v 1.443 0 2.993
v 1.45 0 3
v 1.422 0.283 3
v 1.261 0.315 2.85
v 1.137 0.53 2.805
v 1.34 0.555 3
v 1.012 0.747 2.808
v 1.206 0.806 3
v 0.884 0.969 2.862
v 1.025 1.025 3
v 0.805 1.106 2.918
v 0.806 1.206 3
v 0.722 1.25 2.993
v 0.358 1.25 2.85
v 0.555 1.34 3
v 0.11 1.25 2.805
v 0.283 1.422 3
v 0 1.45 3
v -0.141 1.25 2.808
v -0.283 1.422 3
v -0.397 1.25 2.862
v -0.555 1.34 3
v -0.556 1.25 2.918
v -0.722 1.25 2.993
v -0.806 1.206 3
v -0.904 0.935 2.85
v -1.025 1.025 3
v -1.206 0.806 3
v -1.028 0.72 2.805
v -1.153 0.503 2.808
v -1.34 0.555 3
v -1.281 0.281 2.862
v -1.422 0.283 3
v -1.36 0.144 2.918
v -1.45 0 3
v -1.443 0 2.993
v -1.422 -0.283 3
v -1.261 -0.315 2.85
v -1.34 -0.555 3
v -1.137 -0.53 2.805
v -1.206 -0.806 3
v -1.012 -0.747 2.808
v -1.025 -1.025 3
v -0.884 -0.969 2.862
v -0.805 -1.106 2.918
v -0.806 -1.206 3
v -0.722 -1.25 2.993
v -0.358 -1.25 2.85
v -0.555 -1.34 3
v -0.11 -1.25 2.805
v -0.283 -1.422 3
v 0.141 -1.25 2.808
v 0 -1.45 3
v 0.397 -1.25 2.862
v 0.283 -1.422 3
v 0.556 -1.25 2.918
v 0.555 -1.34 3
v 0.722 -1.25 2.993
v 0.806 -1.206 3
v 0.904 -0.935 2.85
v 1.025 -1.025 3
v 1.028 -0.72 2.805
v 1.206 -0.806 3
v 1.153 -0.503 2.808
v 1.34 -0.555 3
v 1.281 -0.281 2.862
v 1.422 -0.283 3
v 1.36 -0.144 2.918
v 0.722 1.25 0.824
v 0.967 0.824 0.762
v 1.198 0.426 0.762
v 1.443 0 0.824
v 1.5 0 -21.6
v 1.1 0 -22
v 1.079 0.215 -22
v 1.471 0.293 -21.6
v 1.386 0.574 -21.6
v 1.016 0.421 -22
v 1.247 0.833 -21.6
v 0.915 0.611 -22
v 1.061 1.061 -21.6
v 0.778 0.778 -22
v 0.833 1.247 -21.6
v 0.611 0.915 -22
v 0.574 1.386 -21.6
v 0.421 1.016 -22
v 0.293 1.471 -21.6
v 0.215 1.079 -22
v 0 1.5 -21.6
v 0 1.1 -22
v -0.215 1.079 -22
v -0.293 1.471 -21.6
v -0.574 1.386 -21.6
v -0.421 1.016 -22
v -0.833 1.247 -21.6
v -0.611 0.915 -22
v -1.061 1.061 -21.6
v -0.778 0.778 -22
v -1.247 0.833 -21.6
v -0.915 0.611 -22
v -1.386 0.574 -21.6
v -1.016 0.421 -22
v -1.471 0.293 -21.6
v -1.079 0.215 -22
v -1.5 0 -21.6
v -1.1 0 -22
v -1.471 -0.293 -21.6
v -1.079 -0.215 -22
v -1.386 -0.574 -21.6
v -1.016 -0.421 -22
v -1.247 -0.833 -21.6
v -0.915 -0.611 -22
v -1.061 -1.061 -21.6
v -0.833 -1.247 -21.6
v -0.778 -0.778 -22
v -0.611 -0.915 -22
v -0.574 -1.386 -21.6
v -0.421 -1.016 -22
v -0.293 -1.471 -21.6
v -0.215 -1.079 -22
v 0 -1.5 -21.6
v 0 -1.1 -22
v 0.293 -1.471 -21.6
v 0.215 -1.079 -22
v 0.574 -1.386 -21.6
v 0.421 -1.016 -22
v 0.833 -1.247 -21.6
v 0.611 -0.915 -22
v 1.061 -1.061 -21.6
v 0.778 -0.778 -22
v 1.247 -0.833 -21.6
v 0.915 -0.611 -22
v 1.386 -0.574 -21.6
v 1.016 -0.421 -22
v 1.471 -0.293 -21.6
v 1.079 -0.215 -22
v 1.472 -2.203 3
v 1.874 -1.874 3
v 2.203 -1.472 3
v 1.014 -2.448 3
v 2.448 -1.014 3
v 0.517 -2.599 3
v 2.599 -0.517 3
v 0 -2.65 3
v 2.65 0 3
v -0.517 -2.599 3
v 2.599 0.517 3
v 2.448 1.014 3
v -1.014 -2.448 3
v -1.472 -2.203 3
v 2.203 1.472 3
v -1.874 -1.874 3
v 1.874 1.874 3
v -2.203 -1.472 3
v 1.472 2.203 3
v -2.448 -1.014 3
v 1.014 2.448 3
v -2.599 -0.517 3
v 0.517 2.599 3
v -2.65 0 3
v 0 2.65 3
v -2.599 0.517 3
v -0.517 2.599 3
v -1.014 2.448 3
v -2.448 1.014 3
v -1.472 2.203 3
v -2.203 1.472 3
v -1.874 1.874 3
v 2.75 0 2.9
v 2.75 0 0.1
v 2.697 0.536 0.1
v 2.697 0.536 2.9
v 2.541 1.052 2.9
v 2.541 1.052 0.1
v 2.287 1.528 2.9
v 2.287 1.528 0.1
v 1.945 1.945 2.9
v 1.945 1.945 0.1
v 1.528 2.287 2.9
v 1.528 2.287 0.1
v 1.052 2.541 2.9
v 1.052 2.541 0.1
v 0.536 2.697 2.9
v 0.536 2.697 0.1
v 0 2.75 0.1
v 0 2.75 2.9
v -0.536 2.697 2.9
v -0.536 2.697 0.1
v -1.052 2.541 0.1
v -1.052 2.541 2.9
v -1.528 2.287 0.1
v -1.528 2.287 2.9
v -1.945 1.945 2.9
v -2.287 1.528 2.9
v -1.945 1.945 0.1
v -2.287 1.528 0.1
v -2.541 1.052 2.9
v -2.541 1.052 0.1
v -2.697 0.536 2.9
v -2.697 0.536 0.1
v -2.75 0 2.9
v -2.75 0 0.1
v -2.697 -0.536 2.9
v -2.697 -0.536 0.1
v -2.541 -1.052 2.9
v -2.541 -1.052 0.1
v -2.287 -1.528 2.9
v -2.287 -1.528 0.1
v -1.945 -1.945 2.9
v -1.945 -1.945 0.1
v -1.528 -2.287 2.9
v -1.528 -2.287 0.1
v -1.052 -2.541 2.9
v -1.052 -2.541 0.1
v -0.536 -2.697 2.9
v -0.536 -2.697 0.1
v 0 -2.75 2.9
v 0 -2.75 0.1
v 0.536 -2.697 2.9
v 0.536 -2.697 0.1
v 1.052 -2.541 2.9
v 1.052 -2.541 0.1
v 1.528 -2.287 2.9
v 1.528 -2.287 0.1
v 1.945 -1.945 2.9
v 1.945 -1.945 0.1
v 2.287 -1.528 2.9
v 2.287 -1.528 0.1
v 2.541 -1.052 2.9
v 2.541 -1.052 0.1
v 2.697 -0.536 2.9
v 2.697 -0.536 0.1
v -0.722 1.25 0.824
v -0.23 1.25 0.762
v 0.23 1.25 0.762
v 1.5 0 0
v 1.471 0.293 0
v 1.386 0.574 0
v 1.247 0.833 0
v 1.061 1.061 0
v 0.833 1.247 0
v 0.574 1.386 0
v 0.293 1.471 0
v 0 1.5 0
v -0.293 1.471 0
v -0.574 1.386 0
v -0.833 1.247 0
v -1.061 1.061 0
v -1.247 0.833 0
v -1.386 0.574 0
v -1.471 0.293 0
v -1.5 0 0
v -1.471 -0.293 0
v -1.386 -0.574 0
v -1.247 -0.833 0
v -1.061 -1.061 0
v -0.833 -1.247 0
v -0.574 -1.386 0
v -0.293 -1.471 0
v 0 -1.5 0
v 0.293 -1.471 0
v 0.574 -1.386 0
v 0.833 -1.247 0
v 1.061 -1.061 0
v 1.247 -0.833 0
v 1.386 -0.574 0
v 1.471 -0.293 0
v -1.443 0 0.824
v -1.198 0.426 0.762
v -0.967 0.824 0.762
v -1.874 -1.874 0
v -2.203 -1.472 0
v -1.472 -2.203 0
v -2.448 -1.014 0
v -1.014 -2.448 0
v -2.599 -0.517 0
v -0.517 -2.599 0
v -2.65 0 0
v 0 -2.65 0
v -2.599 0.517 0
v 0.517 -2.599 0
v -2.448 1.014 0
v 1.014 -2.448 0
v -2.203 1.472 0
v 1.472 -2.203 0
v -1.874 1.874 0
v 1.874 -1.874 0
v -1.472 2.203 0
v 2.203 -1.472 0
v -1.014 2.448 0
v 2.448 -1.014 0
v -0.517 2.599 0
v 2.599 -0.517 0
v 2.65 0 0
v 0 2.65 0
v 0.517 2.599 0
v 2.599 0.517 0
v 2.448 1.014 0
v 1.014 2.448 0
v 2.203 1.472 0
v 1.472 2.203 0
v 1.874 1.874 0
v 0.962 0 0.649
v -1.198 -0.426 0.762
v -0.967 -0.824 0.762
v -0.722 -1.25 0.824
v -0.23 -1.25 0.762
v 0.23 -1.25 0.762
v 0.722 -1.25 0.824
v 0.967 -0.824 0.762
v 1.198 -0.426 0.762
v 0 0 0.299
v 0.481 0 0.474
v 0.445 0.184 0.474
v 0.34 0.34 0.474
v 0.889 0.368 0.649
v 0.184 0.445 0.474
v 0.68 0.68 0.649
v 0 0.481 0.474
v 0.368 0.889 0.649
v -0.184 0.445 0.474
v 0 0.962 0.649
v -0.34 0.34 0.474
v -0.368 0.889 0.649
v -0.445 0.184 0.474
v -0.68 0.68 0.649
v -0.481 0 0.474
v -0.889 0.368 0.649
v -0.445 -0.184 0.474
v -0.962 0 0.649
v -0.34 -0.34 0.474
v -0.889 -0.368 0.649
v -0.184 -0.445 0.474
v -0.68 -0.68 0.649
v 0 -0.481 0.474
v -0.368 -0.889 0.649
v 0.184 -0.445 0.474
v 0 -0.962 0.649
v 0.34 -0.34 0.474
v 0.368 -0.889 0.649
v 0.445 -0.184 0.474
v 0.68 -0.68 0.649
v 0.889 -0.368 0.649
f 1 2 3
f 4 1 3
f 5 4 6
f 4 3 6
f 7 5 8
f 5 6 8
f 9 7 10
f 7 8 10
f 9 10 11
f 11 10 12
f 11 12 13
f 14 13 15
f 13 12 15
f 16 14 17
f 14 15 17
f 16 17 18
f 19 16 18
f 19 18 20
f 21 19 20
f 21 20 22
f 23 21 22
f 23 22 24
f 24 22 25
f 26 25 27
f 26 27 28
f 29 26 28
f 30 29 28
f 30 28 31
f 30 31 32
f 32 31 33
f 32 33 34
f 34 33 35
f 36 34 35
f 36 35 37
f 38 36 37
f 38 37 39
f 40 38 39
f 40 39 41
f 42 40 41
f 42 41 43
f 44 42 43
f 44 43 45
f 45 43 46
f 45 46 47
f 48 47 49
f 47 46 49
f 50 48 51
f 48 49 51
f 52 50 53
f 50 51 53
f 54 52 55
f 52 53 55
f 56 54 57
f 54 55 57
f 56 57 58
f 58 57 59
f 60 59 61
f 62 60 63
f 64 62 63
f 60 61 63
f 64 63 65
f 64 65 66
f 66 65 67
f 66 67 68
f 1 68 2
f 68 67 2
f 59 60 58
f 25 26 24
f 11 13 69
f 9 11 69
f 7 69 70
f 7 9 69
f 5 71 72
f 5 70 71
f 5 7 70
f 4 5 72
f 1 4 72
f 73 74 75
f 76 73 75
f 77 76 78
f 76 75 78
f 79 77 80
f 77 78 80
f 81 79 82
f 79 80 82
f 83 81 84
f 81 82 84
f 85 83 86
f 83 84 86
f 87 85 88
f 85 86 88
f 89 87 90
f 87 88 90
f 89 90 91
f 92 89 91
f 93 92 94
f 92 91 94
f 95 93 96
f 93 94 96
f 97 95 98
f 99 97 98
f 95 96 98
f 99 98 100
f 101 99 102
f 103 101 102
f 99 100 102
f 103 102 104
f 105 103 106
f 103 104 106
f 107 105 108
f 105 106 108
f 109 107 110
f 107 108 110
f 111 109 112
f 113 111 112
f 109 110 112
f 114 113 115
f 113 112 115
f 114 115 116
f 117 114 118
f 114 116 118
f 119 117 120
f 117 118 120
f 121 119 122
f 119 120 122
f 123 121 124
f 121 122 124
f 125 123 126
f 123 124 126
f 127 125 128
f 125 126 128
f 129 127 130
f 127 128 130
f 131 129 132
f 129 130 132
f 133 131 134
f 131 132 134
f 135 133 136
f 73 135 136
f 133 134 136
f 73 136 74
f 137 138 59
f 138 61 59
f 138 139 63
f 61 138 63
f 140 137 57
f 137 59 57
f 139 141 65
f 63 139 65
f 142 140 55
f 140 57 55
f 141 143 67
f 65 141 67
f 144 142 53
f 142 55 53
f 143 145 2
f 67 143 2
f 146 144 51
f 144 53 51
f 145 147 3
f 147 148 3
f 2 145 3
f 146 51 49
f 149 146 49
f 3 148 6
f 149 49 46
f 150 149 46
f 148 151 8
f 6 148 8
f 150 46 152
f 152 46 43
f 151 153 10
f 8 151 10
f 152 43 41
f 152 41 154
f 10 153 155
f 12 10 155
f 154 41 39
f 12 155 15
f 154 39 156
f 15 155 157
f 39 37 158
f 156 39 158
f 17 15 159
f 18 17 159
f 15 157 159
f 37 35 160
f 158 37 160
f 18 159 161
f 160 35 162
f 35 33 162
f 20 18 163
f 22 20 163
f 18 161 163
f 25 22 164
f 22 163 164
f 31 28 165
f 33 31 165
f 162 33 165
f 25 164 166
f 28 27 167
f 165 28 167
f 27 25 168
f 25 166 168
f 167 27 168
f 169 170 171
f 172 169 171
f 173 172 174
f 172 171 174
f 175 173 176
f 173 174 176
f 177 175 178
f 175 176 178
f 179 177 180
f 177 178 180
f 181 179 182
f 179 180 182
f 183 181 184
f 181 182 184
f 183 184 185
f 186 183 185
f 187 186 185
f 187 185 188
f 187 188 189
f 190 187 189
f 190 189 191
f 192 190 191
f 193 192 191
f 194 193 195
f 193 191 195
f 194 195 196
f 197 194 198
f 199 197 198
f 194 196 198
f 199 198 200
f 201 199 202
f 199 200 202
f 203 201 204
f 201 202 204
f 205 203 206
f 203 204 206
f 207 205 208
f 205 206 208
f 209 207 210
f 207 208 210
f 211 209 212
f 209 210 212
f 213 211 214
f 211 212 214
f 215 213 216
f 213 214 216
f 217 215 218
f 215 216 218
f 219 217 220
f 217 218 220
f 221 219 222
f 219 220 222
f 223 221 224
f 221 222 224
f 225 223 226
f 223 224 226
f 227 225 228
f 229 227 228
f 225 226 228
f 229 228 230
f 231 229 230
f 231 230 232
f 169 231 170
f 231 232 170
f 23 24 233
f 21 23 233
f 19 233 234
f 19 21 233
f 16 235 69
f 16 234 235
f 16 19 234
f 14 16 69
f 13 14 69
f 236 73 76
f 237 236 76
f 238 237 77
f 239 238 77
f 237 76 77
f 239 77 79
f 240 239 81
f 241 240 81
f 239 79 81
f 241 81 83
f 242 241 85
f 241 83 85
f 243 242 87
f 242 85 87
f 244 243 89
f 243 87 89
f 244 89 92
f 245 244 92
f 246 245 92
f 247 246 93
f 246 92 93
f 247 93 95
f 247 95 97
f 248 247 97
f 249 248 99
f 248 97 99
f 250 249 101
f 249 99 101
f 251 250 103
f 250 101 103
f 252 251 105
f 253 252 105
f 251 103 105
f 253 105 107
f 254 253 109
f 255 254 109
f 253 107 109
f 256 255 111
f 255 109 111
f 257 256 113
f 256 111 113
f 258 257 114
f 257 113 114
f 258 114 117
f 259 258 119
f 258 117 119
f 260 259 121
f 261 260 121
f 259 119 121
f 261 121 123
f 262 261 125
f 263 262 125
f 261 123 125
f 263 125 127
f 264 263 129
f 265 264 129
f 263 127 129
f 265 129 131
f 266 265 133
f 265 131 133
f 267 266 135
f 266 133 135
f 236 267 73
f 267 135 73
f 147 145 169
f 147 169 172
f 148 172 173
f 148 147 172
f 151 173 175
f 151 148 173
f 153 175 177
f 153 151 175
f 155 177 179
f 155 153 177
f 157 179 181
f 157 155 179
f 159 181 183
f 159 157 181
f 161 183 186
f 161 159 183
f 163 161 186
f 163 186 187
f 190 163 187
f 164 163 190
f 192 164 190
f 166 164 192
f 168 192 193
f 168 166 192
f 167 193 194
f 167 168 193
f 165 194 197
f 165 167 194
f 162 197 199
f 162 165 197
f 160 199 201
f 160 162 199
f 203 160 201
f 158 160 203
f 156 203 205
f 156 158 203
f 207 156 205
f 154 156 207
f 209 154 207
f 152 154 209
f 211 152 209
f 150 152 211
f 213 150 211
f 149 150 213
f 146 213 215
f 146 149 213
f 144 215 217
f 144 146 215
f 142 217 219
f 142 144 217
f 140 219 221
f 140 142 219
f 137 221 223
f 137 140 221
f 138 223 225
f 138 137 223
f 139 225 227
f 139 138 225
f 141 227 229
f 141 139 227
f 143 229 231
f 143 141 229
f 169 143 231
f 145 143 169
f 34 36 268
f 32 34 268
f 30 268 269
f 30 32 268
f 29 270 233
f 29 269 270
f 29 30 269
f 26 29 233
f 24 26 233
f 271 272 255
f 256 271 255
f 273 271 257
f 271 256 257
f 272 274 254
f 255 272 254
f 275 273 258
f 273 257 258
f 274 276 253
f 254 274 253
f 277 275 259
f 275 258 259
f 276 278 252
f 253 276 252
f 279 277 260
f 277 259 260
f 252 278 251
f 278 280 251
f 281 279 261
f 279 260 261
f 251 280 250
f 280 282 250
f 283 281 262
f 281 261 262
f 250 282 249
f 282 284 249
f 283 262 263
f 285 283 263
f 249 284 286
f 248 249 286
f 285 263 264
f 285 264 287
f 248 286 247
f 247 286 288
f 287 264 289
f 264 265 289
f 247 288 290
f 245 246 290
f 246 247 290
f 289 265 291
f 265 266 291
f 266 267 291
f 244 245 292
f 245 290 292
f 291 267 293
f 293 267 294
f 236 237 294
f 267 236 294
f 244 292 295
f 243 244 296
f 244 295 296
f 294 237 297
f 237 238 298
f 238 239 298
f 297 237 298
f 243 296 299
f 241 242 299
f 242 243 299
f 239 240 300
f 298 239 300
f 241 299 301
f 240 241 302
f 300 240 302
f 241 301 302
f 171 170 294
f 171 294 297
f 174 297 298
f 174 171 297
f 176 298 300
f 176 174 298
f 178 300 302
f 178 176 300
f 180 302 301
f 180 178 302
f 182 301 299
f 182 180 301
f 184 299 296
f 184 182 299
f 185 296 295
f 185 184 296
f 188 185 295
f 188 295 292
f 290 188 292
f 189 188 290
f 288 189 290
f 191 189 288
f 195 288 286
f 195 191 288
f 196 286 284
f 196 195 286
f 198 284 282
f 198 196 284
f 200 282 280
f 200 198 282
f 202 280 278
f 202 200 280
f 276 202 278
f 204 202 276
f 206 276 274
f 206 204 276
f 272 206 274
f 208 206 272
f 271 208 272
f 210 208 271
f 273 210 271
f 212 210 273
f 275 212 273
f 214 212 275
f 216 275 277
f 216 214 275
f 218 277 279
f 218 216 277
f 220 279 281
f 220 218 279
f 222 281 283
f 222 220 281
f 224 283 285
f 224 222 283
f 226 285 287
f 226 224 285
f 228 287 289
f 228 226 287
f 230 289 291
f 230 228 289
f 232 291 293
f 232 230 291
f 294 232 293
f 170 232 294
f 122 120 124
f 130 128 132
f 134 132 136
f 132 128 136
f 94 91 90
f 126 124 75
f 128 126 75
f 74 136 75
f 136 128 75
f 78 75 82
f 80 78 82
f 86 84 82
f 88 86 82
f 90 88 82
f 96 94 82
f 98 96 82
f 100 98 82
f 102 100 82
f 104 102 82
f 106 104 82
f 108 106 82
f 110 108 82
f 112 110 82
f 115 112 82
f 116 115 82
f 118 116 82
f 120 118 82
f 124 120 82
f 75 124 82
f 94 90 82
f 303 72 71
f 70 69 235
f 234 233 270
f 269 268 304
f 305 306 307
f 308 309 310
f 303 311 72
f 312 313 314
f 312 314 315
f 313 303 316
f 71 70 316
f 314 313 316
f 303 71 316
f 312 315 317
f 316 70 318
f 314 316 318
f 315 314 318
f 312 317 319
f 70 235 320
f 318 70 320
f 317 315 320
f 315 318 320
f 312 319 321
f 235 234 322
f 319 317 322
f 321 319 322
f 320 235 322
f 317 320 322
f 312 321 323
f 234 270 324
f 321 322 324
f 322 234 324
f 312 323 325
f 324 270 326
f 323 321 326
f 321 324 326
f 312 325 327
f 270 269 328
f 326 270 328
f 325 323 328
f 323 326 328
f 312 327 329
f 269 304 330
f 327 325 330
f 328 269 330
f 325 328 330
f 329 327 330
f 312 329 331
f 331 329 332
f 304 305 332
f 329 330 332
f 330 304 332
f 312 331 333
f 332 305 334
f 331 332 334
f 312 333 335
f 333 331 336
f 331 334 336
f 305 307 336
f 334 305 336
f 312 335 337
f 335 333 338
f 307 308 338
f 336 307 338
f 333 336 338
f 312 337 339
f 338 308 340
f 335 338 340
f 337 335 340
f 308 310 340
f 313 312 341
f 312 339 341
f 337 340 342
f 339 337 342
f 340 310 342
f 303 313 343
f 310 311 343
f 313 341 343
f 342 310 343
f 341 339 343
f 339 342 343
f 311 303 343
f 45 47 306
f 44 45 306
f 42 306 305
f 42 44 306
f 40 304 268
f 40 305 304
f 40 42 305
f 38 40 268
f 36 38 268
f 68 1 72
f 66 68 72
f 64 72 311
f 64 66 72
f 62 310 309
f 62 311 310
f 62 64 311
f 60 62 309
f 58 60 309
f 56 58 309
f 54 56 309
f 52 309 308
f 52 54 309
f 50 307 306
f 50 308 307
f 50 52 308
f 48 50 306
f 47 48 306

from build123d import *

# Parameters (mm, degrees)
SKETCH001_R     = 3.75
POCKET_DEPTH    = 9.70192
CHAMFER_SIZE    = 0.4
CHAMFER001_SIZE = 0.1


with BuildPart() as pocket:
    # Sketch003 → Revolution001 (revolve)
    with BuildSketch(Plane.XZ):
        Polygon((0, 0.29908), (2.75, 1.3), (2.75, 10), (0, 10), align=None)
    revolve(axis=Axis((0, 0, 0), (0, 0, 1)))

    # Sketch001 → Pocket (cut, through all)
    with BuildSketch(Plane(origin=(0, 0, 10), x_dir=(-1, 0, 0), z_dir=(0, 0, 1))):
        Circle(SKETCH001_R)
        Polygon((-0.721688, 1.25), (0.721688, 1.25), (1.443376, 0), (0.721688, -1.25), (-0.721688, -1.25), (-1.443376, 0), align=None, mode=Mode.SUBTRACT)
    extrude(amount=-POCKET_DEPTH, mode=Mode.SUBTRACT)


with BuildPart() as chamfer001:
    # Sketch → Revolution (revolve)
    with BuildSketch(Plane.XZ):
        Polygon((1.45, 3), (2.75, 3), (2.75, 0), (1.5, 0), (1.5, -22), (0, -22), (0, 1.549999), align=None)
    revolve(axis=Axis((0, 0, 0), (0, 0, 1)))

    # Cut: cut Pocket
    add(pocket.part, mode=Mode.SUBTRACT)

    # Chamfer
    chamfer_edges = [chamfer001.edges().sort_by_distance(p)[0] for p in [
        (-1.5, 0, -22),
    ]]
    chamfer(chamfer_edges, length=CHAMFER_SIZE)

    # Chamfer001
    chamfer001_edges = [chamfer001.edges().sort_by_distance(p)[0] for p in [
        (-2.75, 0, 0),
        (-2.75, 0, 3),
    ]]
    chamfer(chamfer001_edges, length=CHAMFER001_SIZE)


solid = chamfer001.part
